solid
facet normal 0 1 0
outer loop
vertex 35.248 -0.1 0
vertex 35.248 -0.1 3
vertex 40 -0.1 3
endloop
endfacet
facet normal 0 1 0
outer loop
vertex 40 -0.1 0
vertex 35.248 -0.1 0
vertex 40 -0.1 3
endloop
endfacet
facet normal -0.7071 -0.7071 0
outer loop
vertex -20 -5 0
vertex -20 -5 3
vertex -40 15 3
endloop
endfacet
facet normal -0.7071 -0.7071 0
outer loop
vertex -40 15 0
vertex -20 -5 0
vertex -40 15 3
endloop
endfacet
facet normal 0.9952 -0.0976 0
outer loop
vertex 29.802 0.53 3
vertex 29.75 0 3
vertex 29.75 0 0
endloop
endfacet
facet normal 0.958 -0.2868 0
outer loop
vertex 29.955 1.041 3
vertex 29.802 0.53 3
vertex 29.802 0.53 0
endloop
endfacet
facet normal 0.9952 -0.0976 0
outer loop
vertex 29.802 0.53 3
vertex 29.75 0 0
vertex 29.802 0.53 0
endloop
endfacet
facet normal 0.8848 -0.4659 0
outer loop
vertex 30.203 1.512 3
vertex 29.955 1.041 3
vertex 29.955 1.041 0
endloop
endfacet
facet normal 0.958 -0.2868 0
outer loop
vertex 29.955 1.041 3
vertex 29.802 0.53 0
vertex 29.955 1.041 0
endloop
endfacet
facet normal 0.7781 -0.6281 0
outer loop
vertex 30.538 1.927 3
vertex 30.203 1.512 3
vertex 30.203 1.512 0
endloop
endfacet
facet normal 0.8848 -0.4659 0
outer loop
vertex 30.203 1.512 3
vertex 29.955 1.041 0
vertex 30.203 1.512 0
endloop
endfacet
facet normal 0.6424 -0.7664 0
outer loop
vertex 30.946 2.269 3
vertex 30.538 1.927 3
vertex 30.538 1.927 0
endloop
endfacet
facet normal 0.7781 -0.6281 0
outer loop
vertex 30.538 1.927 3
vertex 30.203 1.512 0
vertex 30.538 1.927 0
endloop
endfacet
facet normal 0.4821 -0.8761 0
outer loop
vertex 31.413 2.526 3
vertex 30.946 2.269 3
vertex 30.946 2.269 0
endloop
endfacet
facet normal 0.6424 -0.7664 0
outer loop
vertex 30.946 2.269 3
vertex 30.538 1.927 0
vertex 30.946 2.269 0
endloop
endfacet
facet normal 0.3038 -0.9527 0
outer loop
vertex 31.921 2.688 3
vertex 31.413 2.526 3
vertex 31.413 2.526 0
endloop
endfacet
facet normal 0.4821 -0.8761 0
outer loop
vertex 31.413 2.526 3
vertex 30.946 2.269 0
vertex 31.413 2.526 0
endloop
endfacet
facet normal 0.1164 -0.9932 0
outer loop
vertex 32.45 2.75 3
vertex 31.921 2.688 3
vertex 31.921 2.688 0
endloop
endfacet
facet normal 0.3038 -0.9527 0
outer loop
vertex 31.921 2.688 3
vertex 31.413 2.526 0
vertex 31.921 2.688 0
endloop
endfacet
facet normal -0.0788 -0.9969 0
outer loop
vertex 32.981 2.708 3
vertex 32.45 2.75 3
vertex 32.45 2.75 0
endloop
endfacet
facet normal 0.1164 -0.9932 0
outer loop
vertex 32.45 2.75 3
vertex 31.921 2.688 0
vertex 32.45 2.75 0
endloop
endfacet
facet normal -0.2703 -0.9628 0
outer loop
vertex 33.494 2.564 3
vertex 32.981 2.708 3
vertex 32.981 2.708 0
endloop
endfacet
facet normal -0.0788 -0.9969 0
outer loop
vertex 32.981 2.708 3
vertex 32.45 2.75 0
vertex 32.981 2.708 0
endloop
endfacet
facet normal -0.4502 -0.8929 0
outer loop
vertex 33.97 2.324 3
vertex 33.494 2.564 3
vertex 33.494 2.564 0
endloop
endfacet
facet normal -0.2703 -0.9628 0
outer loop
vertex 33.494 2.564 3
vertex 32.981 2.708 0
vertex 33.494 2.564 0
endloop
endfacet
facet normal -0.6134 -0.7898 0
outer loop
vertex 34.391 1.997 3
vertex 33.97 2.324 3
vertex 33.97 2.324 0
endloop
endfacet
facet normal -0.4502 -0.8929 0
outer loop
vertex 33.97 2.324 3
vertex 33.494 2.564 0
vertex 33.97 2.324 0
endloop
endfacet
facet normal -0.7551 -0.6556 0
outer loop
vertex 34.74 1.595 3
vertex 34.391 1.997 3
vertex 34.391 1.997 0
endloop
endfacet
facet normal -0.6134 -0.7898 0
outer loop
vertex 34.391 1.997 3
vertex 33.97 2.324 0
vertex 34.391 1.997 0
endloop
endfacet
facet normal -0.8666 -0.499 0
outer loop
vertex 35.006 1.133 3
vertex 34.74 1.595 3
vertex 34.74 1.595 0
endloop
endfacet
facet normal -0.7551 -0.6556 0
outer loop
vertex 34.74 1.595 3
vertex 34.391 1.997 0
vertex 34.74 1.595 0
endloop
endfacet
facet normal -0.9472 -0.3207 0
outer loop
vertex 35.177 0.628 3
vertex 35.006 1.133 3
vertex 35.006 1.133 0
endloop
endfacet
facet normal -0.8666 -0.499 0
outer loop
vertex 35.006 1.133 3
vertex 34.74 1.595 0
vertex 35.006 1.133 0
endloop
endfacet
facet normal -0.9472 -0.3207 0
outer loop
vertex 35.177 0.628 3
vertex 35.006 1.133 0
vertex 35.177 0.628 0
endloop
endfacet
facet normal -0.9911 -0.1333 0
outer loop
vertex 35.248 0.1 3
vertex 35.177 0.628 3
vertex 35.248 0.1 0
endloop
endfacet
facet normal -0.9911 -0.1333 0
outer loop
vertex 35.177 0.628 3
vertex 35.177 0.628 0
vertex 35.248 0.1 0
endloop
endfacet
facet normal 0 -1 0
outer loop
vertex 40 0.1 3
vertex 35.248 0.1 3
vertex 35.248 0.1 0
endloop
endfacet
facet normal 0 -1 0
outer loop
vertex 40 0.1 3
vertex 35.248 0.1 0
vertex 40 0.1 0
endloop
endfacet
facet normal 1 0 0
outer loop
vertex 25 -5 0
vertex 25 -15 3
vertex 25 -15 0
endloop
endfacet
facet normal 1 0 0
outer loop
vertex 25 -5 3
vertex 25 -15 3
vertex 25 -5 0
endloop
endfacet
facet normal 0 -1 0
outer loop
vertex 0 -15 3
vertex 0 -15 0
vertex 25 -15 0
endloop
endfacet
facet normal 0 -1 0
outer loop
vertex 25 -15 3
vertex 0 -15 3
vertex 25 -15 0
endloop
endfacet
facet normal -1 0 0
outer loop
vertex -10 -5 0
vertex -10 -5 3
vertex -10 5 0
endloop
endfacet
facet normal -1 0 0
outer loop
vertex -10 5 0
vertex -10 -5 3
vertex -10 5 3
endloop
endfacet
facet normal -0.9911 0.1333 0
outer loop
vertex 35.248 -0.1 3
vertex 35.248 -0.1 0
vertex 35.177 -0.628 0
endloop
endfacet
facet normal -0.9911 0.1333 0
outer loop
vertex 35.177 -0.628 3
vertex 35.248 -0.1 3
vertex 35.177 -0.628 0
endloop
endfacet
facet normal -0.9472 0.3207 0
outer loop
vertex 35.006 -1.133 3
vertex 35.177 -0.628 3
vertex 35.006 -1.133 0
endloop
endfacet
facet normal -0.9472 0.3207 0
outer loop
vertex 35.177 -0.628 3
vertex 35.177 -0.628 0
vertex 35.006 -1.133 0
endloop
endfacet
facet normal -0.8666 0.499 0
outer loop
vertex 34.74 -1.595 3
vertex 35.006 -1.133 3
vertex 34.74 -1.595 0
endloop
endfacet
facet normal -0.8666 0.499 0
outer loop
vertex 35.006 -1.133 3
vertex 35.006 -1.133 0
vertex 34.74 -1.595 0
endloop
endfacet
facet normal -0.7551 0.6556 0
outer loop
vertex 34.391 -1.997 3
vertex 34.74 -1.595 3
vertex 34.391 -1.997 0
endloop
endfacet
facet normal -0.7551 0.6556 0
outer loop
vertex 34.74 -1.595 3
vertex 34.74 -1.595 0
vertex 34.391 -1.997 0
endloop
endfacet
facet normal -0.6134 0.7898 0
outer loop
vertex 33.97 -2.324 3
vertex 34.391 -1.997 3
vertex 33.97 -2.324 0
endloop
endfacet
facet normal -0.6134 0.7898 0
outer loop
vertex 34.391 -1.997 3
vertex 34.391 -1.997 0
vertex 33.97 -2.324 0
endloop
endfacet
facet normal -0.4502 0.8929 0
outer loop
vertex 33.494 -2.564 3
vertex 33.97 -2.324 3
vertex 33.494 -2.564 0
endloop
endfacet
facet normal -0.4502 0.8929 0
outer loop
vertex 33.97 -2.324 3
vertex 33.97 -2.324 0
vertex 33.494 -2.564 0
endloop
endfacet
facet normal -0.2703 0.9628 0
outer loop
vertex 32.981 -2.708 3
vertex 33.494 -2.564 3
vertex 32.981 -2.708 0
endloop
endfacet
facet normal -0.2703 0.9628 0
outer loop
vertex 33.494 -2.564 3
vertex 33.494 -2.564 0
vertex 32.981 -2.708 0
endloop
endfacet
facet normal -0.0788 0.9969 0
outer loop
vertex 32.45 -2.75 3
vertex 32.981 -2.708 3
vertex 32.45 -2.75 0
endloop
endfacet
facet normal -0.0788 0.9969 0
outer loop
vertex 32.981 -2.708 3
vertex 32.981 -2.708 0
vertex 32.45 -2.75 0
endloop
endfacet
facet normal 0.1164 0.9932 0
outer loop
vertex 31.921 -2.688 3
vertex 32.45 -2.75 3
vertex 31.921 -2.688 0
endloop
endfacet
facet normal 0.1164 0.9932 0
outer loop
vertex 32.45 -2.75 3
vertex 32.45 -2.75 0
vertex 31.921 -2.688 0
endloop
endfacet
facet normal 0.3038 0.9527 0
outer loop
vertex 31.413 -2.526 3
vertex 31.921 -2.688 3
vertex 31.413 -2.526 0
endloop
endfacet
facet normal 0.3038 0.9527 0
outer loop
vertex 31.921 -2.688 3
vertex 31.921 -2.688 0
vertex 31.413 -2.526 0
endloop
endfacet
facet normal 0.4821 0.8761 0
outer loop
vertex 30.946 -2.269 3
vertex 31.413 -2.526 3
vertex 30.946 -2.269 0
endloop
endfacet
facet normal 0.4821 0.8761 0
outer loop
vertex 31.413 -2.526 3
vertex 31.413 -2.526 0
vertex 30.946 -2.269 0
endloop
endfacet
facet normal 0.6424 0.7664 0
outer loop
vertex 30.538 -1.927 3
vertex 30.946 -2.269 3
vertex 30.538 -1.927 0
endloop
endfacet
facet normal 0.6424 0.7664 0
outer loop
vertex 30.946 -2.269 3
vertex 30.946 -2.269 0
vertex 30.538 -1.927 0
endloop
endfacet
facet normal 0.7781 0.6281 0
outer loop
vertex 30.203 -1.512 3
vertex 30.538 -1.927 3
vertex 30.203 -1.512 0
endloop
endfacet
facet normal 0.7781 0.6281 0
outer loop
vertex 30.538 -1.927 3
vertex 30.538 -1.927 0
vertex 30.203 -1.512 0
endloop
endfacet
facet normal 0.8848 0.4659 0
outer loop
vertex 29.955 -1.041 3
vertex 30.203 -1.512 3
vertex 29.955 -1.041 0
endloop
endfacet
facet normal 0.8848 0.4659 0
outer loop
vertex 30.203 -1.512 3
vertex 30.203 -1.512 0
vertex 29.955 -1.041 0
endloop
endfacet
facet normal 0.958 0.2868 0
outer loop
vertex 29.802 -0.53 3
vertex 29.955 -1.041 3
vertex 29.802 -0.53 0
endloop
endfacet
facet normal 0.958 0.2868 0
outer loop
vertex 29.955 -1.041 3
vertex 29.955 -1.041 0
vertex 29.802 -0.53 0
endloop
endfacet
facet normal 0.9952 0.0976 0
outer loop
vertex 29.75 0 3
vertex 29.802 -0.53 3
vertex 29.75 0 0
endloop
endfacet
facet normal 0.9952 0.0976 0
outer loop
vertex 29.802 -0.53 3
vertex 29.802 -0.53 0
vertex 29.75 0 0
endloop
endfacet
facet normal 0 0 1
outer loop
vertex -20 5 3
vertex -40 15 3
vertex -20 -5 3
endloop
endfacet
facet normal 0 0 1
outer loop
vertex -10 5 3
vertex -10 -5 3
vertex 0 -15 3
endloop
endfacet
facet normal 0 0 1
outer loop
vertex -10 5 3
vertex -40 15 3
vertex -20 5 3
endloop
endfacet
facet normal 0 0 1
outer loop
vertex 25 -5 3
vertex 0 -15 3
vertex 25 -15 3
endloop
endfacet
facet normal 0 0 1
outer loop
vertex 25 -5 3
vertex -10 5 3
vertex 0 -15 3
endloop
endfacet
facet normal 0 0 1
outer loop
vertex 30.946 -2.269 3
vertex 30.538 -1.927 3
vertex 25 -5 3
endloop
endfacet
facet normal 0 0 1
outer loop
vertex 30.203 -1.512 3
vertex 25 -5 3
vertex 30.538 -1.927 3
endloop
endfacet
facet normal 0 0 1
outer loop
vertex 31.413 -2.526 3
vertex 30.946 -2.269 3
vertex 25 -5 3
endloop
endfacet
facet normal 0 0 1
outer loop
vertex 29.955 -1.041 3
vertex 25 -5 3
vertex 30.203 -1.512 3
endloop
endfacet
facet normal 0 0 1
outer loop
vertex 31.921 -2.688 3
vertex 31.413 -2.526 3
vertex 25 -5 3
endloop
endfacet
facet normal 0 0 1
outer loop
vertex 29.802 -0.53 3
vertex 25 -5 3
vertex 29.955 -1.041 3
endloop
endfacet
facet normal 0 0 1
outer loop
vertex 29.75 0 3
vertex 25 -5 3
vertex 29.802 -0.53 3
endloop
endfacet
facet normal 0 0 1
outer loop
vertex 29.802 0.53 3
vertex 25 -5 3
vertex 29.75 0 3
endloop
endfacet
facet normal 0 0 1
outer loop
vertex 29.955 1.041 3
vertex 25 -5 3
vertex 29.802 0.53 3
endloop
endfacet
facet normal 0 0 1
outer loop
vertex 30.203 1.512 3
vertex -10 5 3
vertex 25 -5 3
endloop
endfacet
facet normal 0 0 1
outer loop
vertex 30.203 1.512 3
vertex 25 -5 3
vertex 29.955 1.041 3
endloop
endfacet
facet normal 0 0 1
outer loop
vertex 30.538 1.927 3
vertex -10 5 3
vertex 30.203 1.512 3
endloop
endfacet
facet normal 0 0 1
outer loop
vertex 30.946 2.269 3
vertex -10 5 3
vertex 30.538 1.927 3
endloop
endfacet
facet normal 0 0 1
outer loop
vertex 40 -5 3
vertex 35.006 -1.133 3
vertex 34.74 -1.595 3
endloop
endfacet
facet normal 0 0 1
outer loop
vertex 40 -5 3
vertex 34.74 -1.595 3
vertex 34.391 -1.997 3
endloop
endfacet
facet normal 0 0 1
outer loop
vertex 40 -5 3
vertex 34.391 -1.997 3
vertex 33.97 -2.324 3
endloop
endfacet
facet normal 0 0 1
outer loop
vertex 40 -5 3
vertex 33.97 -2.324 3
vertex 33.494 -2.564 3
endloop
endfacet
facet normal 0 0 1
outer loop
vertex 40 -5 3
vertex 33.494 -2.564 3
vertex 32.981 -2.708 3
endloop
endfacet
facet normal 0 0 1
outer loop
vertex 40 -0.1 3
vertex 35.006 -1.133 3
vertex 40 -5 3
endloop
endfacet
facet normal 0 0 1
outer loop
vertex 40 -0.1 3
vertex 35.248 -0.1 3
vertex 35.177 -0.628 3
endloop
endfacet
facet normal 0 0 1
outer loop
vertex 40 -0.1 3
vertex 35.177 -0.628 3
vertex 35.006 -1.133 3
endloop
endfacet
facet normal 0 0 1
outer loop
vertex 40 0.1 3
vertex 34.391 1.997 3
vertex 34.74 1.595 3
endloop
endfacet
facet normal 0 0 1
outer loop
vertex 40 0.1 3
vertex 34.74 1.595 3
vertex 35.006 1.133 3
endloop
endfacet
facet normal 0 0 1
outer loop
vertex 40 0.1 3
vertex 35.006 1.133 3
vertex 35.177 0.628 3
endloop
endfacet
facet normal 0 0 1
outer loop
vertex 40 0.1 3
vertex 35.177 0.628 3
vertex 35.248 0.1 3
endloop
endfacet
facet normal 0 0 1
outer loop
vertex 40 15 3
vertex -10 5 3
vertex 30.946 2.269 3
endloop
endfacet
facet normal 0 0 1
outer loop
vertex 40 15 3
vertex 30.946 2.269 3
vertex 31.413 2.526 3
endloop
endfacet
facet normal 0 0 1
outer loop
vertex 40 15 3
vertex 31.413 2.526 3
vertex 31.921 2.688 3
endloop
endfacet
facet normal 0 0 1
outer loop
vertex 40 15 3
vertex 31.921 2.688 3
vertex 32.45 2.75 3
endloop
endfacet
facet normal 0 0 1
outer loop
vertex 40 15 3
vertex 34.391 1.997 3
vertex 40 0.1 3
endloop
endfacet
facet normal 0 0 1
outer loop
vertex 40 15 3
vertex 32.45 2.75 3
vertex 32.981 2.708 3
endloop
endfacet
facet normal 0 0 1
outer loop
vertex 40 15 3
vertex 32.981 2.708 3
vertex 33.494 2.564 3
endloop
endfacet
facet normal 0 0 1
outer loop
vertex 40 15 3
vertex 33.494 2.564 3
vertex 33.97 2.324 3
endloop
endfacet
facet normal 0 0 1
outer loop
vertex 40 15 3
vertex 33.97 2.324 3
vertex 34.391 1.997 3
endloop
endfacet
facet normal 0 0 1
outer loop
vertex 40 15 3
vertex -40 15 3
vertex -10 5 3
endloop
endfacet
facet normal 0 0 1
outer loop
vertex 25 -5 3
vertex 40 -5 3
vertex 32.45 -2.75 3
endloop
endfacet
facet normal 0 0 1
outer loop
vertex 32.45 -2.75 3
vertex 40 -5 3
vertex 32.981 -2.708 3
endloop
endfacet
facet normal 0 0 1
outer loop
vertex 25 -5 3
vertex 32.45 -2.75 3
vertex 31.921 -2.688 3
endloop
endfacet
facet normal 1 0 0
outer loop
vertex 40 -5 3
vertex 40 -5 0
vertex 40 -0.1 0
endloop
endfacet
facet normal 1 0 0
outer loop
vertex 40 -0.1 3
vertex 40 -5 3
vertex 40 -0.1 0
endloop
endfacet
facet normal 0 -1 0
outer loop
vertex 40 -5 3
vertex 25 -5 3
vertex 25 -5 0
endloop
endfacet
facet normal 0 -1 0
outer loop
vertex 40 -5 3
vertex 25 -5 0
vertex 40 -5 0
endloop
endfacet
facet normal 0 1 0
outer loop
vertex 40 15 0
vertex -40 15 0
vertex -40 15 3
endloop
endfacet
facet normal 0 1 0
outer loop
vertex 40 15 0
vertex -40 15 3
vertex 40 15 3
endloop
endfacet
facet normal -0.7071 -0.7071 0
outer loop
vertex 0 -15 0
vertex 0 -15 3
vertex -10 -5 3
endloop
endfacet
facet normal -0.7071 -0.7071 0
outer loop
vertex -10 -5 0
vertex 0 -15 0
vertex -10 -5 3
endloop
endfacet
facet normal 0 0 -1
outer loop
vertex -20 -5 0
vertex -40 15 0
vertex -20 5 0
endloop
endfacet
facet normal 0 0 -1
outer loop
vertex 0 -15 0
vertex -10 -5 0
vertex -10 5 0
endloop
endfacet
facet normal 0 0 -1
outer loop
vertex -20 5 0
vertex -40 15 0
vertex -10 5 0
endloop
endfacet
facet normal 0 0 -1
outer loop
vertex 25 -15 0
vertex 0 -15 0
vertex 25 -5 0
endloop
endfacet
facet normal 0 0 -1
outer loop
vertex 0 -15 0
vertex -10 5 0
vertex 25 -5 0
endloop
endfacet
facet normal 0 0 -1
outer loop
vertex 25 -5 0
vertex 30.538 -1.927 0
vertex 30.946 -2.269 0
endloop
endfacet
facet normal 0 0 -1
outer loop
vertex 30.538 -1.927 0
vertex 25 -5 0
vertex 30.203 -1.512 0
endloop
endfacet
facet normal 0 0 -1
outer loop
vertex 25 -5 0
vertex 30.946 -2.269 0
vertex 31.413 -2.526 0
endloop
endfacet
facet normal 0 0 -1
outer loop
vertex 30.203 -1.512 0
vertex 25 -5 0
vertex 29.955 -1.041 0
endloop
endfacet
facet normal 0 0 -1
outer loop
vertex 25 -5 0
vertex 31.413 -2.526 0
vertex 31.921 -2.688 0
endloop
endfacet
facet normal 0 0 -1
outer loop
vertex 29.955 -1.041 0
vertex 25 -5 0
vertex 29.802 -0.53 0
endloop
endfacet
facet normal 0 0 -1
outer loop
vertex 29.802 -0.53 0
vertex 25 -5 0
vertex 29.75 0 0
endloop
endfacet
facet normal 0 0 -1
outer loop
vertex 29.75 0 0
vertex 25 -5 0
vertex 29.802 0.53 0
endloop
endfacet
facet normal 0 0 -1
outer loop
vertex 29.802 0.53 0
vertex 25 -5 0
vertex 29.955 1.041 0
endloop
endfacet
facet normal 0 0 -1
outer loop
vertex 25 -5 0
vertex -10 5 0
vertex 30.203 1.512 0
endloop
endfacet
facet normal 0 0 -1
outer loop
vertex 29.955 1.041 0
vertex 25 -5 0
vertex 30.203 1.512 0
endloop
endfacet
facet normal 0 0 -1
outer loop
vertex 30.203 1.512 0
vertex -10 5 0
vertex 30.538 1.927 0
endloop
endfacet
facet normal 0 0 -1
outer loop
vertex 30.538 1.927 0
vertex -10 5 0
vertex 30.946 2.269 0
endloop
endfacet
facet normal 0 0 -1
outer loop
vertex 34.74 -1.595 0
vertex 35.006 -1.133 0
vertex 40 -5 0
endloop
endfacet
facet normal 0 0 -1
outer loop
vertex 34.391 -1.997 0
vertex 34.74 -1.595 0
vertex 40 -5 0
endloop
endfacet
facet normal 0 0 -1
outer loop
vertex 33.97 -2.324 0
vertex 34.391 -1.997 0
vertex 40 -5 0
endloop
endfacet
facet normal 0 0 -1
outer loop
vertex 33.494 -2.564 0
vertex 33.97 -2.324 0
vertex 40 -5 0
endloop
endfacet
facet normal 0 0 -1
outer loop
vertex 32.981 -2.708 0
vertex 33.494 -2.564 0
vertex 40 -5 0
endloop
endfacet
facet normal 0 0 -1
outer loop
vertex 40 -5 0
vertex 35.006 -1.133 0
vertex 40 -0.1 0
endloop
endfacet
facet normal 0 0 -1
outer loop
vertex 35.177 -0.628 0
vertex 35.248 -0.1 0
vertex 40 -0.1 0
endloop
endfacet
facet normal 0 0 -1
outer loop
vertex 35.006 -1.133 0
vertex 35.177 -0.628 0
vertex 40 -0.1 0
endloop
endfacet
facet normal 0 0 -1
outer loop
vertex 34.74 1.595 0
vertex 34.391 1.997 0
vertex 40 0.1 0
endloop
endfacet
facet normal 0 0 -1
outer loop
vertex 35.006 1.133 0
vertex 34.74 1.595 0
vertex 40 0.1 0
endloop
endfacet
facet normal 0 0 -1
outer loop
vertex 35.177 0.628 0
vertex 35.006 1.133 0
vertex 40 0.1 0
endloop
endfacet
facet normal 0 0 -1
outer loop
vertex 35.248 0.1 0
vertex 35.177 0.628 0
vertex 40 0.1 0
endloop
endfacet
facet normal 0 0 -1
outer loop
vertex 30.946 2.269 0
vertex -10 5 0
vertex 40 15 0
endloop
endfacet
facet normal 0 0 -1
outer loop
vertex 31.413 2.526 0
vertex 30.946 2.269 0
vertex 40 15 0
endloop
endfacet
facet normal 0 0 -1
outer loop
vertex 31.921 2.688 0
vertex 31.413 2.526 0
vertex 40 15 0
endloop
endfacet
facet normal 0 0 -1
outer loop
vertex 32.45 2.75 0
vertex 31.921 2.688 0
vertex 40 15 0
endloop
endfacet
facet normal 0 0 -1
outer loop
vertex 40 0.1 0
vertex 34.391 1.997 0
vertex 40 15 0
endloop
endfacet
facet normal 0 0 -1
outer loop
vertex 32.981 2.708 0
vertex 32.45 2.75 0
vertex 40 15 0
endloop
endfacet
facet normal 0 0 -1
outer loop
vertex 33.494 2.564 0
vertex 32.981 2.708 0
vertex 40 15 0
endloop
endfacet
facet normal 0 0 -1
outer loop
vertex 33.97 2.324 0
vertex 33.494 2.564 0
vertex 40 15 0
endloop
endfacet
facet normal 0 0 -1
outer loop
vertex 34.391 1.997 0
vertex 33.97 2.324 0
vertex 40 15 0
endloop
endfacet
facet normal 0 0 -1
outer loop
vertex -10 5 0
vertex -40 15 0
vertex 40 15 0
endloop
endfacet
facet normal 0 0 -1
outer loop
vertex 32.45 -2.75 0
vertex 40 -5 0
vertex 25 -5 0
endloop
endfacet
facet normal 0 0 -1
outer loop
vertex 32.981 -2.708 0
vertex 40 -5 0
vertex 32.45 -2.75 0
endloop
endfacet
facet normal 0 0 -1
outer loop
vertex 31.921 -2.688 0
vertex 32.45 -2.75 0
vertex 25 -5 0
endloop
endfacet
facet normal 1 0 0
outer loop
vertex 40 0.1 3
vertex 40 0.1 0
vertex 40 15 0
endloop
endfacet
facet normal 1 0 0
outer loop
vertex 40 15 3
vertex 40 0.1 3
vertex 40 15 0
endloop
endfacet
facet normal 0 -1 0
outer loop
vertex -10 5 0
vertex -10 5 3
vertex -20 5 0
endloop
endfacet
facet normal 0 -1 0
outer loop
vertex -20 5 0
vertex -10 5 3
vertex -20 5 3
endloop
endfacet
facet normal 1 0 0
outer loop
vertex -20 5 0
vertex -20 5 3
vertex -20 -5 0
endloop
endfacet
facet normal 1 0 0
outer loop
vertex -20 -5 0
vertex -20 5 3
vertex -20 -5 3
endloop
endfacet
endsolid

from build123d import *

# Parameters (mm, degrees)
ESBO_O1_W                = 80
ESBO_O1_H                = 30
RESSALTO_EXTRUS_O1_DEPTH = 3
ESBO_O3_W                = 15
ESBO_O3_H                = 10
CORTE_EXTRUS_O1_DEPTH    = 43.825226211
FURO_COM_FOLGA_DE_M51_D  = 5.5
ESBO_O6_W                = 7.5
ESBO_O6_H                = 0.2
CORTE_EXTRUS_O2_DEPTH    = 10


with BuildPart() as part:
    # Esboço1 → Ressalto-extrusão1 (new body)
    with BuildSketch(Plane.XY):
        Rectangle(ESBO_O1_W, ESBO_O1_H)
    extrude(amount=RESSALTO_EXTRUS_O1_DEPTH)

    # Esboço3 → Corte-extrusão1 (cut, through all)
    with BuildSketch(Plane.XY.offset(3)):
        Polygon((-40, 15), (-40, -15), (0, -15), (-10, -5), (-10, 5), (-20, 5), (-20, -5), align=None)
        with Locations((32.5, -10)):
            Rectangle(ESBO_O3_W, ESBO_O3_H)
    extrude(amount=-CORTE_EXTRUS_O1_DEPTH, mode=Mode.SUBTRACT)

    # Furo com folga de M51 (through all)
    with Locations(Plane.XY.offset(3)):
        with Locations((32.5, 0)):
            Hole(FURO_COM_FOLGA_DE_M51_D / 2)

    # Esboço6 → Corte-extrusão2 (cut)
    with BuildSketch(Plane.XY.offset(3)):
        with Locations((36.25, 0)):
            Rectangle(ESBO_O6_W, ESBO_O6_H)
    extrude(amount=-CORTE_EXTRUS_O2_DEPTH, mode=Mode.SUBTRACT)


solid = part.part
